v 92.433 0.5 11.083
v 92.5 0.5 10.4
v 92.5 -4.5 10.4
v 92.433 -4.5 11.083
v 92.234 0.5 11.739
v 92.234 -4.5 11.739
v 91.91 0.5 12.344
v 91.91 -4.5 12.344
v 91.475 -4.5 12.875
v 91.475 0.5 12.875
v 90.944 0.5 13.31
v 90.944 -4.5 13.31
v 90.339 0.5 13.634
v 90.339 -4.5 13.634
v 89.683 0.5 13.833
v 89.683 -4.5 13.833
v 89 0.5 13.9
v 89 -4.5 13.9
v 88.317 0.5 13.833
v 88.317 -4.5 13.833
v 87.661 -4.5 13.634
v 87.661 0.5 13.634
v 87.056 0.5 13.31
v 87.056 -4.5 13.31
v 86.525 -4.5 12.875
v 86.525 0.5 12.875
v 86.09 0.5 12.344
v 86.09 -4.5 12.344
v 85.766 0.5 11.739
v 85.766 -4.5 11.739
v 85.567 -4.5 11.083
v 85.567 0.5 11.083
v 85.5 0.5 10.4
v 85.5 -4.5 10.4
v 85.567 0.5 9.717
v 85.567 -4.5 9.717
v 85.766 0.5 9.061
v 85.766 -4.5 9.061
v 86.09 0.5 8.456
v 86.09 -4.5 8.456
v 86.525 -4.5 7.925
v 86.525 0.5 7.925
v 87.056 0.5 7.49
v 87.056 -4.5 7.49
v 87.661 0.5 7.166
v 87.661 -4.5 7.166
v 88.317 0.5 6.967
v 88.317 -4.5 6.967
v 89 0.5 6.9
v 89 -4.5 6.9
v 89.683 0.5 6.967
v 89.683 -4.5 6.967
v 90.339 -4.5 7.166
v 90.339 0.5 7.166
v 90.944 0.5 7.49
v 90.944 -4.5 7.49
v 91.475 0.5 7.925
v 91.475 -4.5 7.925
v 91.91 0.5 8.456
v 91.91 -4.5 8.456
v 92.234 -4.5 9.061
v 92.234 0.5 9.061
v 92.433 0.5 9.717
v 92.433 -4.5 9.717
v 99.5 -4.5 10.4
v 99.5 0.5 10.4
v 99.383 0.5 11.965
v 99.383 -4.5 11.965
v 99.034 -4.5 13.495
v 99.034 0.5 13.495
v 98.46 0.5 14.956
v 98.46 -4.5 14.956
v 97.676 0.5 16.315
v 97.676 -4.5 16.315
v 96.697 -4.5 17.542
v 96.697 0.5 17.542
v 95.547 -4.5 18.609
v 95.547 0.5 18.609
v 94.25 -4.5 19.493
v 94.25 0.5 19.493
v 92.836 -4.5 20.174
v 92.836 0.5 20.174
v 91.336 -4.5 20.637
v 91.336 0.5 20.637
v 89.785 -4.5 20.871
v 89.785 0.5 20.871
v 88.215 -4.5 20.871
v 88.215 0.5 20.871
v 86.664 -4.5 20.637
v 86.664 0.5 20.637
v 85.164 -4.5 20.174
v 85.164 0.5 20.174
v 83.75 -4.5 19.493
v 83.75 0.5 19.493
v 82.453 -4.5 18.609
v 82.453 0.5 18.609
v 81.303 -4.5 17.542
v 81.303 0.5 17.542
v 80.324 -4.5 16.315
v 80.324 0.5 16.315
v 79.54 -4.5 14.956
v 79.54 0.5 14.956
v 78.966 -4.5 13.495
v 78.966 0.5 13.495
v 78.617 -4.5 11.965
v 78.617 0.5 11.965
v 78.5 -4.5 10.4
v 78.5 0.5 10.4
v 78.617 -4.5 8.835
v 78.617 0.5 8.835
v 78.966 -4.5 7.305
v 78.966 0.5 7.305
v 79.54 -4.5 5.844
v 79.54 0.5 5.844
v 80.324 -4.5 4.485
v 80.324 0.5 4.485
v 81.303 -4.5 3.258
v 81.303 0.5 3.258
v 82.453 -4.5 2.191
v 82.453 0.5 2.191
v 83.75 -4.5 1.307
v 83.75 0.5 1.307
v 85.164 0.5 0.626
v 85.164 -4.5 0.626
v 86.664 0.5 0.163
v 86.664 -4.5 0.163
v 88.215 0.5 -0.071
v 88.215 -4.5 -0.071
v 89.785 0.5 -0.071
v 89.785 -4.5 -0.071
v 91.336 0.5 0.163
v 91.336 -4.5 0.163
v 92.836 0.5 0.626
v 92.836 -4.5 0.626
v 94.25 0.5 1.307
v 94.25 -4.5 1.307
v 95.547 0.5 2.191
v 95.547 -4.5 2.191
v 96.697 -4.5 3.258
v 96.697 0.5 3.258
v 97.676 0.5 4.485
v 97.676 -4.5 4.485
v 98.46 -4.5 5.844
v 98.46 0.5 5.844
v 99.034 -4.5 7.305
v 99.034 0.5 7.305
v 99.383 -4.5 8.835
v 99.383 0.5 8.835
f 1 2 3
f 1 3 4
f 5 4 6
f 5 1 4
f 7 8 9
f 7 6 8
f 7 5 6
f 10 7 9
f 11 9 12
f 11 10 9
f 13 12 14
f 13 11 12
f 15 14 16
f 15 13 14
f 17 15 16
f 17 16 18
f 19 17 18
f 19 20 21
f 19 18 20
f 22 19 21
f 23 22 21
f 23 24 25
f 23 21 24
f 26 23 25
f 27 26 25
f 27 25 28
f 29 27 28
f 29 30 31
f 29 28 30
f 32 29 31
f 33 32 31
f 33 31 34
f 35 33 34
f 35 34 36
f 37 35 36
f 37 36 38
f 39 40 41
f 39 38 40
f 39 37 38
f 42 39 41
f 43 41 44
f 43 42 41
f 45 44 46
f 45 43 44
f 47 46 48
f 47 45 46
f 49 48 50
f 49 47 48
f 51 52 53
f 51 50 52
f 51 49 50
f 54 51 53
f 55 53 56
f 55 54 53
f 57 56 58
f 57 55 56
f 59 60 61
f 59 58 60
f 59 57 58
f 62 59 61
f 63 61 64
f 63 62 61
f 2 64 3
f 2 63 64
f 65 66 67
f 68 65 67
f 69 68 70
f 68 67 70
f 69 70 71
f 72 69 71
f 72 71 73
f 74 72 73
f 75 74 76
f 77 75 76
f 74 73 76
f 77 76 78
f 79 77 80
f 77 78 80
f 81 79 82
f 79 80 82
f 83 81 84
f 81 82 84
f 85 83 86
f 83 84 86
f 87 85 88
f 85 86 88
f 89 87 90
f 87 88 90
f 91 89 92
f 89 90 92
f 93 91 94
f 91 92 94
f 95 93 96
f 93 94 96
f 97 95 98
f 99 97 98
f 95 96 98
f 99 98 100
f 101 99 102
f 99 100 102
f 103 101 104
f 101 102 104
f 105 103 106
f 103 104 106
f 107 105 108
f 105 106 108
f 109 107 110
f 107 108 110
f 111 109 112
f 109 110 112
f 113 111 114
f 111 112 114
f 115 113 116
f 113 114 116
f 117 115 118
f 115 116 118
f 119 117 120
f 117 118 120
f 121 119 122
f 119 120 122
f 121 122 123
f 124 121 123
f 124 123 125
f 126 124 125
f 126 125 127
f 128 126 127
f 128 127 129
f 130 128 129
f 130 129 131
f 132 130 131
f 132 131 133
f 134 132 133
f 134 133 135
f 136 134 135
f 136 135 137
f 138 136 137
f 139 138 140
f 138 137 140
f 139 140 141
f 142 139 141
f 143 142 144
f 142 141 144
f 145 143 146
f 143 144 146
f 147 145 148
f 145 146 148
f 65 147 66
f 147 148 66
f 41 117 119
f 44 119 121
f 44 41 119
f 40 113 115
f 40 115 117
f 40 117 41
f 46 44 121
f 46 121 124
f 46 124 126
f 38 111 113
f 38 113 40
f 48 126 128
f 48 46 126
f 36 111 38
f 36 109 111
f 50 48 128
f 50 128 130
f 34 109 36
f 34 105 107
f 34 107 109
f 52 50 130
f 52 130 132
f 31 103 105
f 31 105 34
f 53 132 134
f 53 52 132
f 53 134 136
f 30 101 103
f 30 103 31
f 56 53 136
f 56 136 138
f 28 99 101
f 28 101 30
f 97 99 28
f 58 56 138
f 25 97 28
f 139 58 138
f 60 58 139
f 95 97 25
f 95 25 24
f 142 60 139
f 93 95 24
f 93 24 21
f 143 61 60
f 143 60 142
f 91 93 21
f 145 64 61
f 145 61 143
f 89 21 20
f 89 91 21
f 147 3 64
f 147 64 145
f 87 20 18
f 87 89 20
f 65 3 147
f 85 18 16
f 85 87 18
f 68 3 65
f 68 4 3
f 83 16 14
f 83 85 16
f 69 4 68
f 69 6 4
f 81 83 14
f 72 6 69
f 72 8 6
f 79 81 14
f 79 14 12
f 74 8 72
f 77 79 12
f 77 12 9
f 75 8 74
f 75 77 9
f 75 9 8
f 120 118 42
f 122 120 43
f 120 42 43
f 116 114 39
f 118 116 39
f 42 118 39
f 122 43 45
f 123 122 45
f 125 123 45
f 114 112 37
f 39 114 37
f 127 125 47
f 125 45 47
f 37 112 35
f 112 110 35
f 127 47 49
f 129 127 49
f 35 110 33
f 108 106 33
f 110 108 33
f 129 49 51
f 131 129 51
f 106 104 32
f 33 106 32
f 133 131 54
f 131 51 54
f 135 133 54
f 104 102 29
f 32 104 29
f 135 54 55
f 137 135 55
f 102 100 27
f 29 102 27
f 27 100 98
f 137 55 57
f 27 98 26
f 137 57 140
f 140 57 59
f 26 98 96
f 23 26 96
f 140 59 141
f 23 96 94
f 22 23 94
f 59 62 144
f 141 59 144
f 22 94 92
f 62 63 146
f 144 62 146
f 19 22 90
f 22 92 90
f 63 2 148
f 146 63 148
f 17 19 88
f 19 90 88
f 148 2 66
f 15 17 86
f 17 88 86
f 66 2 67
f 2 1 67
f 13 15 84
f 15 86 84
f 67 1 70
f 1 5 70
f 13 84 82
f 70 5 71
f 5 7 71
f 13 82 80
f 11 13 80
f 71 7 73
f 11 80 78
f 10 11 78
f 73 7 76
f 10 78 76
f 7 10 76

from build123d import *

# Parameters (mm, degrees)
CYLINDER013_R                = 3.5
CYLINDER013_DEPTH            = 10
CYLINDER012_R                = 10.5
CYLINDER012_DEPTH            = 5
CUT005014015_PLACEMENT_ANGLE = 90


with BuildPart() as cylinder013:
    # Cylinder013 → Cylinder013 (new body)
    with BuildSketch(Plane.XY.offset(-3)):
        Circle(CYLINDER013_R)
    extrude(amount=CYLINDER013_DEPTH)


with BuildPart() as iman004:
    # Cylinder012 → Cylinder012 (new body)
    with BuildSketch(Plane.XY):
        Circle(CYLINDER012_R)
    extrude(amount=CYLINDER012_DEPTH)

    # Cut005014015: cut Cylinder013
    add(cylinder013.part, mode=Mode.SUBTRACT)


with BuildPart() as iman004_1:
    # Cut005014015 placement: moved
    add(iman004.part.moved(Location((89, 0.5, 10.4))).rotate(Axis((89, 0.5, 10.4), (1, 0, 0)), CUT005014015_PLACEMENT_ANGLE))


solid = iman004_1.part
